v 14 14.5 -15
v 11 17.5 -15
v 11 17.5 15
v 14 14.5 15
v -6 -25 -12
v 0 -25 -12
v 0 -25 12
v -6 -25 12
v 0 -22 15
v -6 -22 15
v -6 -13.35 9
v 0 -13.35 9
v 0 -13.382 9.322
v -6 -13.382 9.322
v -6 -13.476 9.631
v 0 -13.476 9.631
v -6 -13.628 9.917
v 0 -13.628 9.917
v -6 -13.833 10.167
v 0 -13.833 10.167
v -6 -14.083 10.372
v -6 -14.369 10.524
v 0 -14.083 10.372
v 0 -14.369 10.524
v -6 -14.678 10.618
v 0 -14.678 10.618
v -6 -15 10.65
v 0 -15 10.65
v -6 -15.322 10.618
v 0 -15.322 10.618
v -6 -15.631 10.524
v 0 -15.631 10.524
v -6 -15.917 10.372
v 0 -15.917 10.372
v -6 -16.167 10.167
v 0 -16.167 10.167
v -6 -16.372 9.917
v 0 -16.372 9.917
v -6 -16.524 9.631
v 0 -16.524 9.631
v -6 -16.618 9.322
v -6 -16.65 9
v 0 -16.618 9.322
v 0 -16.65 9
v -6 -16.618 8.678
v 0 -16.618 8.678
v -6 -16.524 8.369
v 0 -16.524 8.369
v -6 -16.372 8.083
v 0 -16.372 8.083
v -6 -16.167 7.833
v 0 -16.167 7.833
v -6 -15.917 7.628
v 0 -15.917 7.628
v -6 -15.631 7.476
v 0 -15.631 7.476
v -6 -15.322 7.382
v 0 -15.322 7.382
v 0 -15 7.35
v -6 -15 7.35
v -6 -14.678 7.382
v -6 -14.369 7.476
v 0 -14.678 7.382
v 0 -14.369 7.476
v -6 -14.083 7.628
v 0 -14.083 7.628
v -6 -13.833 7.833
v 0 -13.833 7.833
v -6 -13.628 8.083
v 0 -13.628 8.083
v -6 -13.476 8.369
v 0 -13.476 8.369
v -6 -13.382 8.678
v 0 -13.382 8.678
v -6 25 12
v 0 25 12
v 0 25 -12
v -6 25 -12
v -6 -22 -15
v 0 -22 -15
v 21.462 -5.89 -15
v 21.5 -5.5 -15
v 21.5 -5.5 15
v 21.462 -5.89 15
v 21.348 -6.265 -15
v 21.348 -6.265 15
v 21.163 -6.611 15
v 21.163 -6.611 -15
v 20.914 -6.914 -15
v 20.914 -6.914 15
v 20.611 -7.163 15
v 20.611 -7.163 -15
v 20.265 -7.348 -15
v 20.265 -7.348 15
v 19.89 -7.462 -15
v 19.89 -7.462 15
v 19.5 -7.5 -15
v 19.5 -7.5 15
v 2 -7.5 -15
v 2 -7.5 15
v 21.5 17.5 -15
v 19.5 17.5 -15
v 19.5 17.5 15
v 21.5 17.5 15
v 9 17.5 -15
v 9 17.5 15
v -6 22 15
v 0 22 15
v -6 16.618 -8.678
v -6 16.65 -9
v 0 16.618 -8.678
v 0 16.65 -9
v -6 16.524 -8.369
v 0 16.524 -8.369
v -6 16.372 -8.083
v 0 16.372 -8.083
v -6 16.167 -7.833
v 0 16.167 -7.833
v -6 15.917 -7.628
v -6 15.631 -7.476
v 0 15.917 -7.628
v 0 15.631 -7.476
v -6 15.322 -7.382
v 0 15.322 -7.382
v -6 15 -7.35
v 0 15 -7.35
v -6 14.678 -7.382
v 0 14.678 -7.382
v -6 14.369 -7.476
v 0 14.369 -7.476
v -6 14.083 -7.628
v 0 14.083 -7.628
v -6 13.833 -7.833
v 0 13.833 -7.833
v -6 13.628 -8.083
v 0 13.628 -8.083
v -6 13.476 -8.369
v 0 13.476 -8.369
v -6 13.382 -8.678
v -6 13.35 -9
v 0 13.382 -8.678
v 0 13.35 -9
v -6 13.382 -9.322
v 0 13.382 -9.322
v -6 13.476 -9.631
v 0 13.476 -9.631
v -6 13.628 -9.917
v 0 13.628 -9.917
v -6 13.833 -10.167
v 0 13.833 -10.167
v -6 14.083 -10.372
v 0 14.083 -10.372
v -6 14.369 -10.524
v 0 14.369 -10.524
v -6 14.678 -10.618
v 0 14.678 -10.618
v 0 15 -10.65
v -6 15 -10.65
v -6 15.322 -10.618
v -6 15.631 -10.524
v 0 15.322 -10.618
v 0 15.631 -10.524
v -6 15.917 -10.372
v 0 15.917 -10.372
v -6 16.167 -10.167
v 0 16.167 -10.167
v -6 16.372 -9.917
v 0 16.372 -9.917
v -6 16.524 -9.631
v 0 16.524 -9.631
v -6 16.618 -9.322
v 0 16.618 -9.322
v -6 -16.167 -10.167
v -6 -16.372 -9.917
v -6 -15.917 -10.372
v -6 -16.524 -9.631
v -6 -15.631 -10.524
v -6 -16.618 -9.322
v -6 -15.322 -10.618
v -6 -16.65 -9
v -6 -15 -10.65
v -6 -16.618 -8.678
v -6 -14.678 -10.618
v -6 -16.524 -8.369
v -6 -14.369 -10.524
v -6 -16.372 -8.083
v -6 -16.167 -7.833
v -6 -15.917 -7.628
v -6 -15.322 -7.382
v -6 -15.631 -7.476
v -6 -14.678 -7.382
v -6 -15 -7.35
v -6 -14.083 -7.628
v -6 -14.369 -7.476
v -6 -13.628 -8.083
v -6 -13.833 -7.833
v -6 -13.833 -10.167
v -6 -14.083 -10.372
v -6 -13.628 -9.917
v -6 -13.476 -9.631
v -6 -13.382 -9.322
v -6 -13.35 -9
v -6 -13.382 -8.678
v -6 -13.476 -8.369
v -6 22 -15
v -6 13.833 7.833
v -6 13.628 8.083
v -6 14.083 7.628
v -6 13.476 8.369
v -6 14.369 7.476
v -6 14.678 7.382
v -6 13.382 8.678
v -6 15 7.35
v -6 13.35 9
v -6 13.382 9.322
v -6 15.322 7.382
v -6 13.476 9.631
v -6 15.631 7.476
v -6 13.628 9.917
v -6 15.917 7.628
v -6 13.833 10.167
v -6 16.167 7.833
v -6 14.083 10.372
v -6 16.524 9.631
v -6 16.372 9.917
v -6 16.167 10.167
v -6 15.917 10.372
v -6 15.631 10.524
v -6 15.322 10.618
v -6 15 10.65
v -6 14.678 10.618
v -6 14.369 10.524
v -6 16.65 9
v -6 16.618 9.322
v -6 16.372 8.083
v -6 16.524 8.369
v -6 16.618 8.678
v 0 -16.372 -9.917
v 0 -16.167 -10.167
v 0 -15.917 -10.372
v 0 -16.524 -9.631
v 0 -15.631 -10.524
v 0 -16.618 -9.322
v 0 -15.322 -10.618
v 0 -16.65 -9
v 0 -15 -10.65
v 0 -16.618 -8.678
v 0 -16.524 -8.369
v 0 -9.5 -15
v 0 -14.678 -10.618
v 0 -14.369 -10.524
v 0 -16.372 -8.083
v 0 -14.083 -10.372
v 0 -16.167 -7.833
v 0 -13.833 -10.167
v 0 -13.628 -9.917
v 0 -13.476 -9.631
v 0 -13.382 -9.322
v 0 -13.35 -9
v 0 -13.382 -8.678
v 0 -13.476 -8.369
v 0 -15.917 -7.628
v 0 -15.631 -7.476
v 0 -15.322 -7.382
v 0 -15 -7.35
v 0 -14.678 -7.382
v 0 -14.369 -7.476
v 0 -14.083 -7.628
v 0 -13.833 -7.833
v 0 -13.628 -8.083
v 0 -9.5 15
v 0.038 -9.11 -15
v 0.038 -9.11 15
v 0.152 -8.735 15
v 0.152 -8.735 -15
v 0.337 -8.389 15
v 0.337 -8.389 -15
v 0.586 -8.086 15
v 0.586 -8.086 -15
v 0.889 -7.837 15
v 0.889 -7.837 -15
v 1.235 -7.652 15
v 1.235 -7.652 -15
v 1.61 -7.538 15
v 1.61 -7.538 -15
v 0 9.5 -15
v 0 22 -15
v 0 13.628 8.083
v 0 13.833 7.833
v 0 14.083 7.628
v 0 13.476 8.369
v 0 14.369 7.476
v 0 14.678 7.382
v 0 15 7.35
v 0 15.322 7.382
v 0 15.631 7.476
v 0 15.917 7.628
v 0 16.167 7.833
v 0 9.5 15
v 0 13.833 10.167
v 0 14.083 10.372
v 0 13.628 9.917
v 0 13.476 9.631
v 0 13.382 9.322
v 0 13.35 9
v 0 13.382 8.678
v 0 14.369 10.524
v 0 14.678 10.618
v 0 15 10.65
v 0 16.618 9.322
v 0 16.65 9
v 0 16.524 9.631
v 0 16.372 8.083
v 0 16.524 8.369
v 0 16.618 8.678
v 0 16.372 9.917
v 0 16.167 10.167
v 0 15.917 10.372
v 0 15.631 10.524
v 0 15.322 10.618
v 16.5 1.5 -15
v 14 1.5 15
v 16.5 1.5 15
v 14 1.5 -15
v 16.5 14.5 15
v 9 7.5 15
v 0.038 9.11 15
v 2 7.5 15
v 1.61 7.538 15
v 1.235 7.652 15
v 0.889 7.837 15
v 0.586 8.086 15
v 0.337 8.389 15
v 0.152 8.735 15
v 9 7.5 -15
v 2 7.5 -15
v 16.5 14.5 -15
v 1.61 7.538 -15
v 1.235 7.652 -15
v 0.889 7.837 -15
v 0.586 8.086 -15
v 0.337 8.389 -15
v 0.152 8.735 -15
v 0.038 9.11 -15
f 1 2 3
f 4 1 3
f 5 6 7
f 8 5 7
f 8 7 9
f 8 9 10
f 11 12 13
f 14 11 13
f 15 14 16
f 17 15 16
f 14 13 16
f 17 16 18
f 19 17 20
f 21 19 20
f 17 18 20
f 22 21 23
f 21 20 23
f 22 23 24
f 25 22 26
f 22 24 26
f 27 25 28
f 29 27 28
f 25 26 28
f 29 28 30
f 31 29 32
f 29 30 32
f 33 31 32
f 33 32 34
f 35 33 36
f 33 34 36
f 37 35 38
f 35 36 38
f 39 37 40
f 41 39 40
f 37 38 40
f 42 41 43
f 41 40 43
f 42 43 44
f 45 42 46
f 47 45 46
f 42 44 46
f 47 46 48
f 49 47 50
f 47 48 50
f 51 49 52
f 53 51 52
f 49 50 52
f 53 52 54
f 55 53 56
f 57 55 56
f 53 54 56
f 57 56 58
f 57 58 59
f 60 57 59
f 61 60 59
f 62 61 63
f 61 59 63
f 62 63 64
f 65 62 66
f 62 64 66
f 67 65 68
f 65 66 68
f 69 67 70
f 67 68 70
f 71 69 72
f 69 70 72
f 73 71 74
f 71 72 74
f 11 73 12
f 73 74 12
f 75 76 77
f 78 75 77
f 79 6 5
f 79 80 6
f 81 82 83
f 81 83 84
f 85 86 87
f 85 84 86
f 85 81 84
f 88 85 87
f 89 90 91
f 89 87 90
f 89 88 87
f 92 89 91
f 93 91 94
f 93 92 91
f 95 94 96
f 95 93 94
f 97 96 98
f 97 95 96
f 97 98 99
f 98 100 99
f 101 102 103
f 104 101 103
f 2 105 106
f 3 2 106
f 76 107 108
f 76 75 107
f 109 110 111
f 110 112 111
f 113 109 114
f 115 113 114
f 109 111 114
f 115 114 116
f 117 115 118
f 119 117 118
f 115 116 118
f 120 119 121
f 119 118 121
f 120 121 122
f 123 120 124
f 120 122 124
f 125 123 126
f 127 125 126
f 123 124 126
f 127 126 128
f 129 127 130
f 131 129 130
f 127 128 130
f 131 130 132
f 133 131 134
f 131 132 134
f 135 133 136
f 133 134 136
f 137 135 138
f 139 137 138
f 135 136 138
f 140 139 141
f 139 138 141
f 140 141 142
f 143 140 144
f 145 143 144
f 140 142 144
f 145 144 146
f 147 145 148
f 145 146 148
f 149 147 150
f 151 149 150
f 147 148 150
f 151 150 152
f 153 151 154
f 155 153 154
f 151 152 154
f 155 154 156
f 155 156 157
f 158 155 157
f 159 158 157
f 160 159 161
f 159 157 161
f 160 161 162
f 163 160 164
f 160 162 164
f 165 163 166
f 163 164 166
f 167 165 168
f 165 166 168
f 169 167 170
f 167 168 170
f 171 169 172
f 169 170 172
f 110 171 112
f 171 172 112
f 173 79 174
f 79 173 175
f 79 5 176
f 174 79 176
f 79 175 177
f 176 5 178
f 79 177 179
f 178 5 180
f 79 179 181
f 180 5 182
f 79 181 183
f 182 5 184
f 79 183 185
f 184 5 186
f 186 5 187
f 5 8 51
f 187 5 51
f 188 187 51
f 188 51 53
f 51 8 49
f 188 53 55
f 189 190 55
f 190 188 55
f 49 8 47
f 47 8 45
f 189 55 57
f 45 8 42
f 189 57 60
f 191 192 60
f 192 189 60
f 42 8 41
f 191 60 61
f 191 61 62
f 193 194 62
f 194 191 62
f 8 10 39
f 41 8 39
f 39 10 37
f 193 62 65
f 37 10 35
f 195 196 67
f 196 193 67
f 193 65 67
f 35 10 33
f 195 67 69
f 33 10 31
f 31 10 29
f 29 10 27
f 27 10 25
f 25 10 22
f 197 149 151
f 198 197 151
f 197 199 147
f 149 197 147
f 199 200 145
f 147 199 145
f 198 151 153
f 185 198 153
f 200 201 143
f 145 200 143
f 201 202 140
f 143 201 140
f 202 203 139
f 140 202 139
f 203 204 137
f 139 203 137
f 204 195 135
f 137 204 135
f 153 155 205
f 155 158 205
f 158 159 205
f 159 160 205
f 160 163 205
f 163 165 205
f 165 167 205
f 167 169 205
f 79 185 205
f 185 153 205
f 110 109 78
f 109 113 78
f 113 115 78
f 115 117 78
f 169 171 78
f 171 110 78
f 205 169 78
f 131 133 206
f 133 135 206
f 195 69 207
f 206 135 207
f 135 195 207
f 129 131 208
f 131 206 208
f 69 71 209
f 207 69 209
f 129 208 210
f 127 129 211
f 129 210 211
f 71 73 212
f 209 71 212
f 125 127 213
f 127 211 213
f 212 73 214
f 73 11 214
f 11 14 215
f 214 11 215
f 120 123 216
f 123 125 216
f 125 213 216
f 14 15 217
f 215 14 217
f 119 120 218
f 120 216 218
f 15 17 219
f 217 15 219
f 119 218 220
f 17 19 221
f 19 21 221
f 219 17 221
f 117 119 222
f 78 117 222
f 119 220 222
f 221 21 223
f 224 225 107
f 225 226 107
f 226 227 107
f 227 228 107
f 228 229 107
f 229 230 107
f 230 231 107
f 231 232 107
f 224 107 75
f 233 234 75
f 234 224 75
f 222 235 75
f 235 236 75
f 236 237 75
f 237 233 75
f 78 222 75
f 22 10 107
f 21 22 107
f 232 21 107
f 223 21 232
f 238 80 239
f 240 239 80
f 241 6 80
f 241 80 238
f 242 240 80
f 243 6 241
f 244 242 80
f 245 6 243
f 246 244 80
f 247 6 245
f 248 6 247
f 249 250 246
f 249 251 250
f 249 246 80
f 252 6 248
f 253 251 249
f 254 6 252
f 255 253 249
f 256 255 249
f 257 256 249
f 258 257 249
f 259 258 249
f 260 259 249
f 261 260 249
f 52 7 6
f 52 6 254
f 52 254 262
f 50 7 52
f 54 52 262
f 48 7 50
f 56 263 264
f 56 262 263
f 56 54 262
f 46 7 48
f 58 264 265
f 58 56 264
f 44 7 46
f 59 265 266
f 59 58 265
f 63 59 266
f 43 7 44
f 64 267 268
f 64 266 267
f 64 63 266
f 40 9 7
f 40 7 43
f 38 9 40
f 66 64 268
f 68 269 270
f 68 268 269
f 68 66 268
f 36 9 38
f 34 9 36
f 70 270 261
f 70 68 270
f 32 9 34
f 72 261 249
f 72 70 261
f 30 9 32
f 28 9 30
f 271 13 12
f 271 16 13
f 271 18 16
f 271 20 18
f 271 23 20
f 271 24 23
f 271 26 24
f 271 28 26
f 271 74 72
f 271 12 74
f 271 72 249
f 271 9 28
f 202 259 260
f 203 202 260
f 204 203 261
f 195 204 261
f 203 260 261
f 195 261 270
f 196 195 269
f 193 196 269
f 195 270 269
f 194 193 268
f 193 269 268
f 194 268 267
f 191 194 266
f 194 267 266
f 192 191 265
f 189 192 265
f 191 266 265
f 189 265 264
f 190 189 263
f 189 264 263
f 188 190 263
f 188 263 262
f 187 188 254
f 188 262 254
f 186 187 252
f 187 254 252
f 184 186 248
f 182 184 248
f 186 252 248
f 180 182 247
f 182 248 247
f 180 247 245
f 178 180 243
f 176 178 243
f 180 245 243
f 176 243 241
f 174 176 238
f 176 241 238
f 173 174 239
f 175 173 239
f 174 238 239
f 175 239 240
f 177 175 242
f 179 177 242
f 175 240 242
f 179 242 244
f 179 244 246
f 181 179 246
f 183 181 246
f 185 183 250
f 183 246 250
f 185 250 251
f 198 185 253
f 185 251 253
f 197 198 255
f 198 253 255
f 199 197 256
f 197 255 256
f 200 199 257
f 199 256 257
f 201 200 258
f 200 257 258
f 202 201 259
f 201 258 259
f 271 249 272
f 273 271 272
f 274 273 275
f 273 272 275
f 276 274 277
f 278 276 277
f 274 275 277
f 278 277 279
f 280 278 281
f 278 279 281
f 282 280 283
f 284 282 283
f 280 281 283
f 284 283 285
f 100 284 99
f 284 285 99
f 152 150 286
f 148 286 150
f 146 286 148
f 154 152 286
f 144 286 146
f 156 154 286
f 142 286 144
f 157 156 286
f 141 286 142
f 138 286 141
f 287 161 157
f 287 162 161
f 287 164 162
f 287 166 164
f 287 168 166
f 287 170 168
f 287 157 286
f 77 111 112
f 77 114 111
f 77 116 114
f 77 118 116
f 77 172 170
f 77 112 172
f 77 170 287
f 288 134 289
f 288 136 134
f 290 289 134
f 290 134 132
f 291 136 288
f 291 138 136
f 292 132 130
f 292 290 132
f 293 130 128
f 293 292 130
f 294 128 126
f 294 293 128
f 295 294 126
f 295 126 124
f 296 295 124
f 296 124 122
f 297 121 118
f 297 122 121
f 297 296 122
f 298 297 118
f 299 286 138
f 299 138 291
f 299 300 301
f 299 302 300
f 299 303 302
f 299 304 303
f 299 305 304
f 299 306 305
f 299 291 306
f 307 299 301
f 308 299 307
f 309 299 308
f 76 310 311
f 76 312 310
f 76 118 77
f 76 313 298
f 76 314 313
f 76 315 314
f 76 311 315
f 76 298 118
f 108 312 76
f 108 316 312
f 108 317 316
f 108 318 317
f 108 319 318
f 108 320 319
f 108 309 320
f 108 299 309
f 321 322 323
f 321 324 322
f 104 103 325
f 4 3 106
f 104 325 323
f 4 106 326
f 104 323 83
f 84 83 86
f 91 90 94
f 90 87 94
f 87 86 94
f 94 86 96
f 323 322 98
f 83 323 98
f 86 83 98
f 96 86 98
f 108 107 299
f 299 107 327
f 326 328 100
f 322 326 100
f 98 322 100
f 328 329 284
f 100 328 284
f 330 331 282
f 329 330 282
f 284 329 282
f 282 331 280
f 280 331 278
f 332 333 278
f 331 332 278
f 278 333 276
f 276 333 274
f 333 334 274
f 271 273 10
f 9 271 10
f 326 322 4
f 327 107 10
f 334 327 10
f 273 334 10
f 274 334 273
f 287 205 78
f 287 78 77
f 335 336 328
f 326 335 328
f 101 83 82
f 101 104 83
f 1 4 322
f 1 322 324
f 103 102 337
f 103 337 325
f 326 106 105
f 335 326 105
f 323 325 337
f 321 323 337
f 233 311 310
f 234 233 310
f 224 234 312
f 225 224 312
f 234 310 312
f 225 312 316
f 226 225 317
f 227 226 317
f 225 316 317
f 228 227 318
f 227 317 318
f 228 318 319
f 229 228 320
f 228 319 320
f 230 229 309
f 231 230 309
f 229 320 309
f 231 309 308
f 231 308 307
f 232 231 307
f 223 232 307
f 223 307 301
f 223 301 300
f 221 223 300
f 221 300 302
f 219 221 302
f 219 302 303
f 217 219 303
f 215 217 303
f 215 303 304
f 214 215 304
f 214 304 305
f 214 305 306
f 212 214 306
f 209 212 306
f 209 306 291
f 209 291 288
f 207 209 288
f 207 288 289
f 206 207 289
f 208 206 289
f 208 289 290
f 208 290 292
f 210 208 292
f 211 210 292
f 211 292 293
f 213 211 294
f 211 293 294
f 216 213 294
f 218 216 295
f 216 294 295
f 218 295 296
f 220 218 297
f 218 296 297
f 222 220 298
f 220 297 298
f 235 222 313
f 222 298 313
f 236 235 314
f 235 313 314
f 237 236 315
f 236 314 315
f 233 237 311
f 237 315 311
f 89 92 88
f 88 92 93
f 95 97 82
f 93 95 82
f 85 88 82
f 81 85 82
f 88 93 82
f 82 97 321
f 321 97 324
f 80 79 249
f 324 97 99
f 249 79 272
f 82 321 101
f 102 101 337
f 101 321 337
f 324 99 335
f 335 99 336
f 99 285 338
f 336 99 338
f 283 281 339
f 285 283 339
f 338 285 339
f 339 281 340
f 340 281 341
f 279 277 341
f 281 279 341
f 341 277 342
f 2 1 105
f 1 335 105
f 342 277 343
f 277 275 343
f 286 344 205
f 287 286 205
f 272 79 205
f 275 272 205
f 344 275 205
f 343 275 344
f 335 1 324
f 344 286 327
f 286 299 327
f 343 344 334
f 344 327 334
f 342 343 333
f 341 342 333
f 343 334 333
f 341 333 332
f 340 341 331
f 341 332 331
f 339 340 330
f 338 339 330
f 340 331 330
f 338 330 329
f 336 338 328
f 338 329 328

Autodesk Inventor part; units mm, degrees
ref_plane "YZ Plane" through (0, 0, 0) normal (1, 0, 0) x (0, 1, 0)
ref_plane "XZ Plane" through (0, 0, 0) normal (0, 1, 0) x (-1, 0, 0)
ref_plane "XY Plane" through (0, 0, 0) normal (0, 0, 1) x (1, 0, 0)
sketch "Sketch1" plane through (0, 0, 0) normal (1, 0, 0) x (0, 1, 0)
  line L0 (-25, 15) -> (25, 15)
  line L1 (25, 15) -> (25, -15)
  line L2 (25, -15) -> (-25, -15)
  line L3 (-25, -15) -> (-25, 15)
  line L4 (-25, 15) -> (25, -15) construction
  line L5 (25, 15) -> (-25, -15) construction
  line L6 (-15, -9) -> (15, -9) construction
  line L7 (15, -9) -> (15, 9) construction
  line L8 (15, 9) -> (-15, 9) construction
  line L9 (-15, 9) -> (-15, -9) construction
  line L10 (-15, -9) -> (15, 9) construction
  line L11 (15, -9) -> (-15, 9) construction
  circle A0 centre (15, -9) radius 1.65
  circle A1 centre (15, 9) radius 1.65
  circle A2 centre (-15, 9) radius 1.65
  circle A3 centre (-15, -9) radius 1.65
  point P0 (0, 0)
  dimension "d0" = 50
  dimension "d1" = 30
  dimension "d4" = 30
  dimension "d5" = 3.3
extrude "Extrusion1" add sketch "Sketch1" against normal blind 6
sketch "Sketch2" plane through (0, 0, 0) normal (1, 0, 0) x (0, 0, -1)
  line L0 (15, -25) -> (15, 25) projected
  line L1 (15, 25) -> (-15, 25) projected
  line L2 (-15, 25) -> (-15, -25) projected
  line L3 (-15, -25) -> (15, -25) projected
  circle A0 centre (9, -15) radius 1.65 projected
  circle A1 centre (-9, -15) radius 1.65 projected
  circle A2 centre (-9, 15) radius 1.65 projected
  circle A3 centre (9, 15) radius 1.65 projected
  line L4 (-15, -7.5) -> (15, -7.5)
  line L5 (15, -7.5) -> (15, 7.5)
  line L6 (15, 7.5) -> (-15, 7.5)
  line L7 (-15, 7.5) -> (-15, -7.5)
  line L8 (-15, -7.5) -> (15, 7.5) construction
  line L9 (15, -7.5) -> (-15, 7.5) construction
  point P0 (0, 0)
  point P1 (-15, 7.5)
  point P2 (-15, -7.5)
  dimension "d6" = 15
extrude "Extrusion2" add sketch "Sketch2" along normal blind 9 contours L4 L2 L6 L0
sketch "Sketch3" plane through (9, 0, 0) normal (1, 0, 0) x (0, 0, -1)
  line L0 (-15, 7.5) -> (-15, -7.5) projected
  line L1 (-15, -7.5) -> (15, -7.5) projected
  line L2 (15, -7.5) -> (15, 7.5) projected
  line L3 (15, 7.5) -> (-15, 7.5) projected
  line L4 (-15, -7.5) -> (15, -7.5)
  line L5 (15, -7.5) -> (15, 17.5)
  line L6 (15, 17.5) -> (-15, 17.5)
  line L7 (-15, 17.5) -> (-15, -7.5)
  point P0 (0, 0)
  dimension "d9" = 25
extrude "Extrusion3" add sketch "Sketch3" along normal blind 5
sketch "Sketch4" plane through (14, 0, 0) normal (1, 0, 0) x (0, 0, -1)
  line L0 (-15, 7.5) -> (15, 7.5) projected
  line L1 (15, 7.5) -> (-15, 7.5) projected
  line L2 (-15, -7.5) -> (15, -7.5) projected
  line L3 (15, -7.5) -> (15, 17.5) projected
  line L4 (15, 17.5) -> (-15, 17.5) projected
  line L5 (-15, 17.5) -> (-15, -7.5) projected
  point P0 (0, 0)
  point P1 (15, 7.5)
  point P2 (-15, 7.5)
extrude "Extrusion4" add sketch "Sketch4" along normal blind 2.5 contours L0 L3 L2 L5
sketch "Sketch5" plane through (16.5, 0, 0) normal (1, 0, 0) x (0, 0, -1)
  line L0 (-15, 7.5) -> (15, 7.5) projected
  line L1 (15, 7.5) -> (15, 17.5) projected
  line L2 (15, 17.5) -> (-15, 17.5) projected
  line L3 (-15, 17.5) -> (-15, 7.5) projected
  line L4 (15, -7.5) -> (15, 7.5) projected
  line L5 (15, 7.5) -> (-15, 7.5) projected
  line L6 (-15, 7.5) -> (-15, -7.5) projected
  line L7 (-15, -7.5) -> (15, -7.5) projected
  point P0 (0, 0)
extrude "Extrusion5" add sketch "Sketch5" along normal blind 5
chamfer "Chamfer1" distance 3 angle 45 2 edges at (14, 17.5, 0) (16.5, 17.5, 0)
sketch "Sketch6" plane through (14, 7.5, 15) normal (0, 1, 0) x (1, 0, 0)
  line L0 (0, 0) -> (0, 30) projected
  line L1 (0, 0) -> (2.5, 0) projected
  line L2 (2.5, 30) -> (2.5, 0) projected
  line L3 (0, 30) -> (2.5, 30) projected
  point P0 (-14, 15)
extrude "Extrusion6" cut sketch "Sketch6" against normal blind 6
chamfer "Chamfer2" distance 3 angle 45 4 edges at (-3, 25, 15) (-3, 25, -15) (-3, -25, -15) (-3, -25, 15)
fillet "Fillet1" radius 2 3 edges at (0, 7.5, 0) (0, -7.5, 0) (21.5, -7.5, 0)
properties part number "SEGURO" material "Steel, Mild, Welded"
